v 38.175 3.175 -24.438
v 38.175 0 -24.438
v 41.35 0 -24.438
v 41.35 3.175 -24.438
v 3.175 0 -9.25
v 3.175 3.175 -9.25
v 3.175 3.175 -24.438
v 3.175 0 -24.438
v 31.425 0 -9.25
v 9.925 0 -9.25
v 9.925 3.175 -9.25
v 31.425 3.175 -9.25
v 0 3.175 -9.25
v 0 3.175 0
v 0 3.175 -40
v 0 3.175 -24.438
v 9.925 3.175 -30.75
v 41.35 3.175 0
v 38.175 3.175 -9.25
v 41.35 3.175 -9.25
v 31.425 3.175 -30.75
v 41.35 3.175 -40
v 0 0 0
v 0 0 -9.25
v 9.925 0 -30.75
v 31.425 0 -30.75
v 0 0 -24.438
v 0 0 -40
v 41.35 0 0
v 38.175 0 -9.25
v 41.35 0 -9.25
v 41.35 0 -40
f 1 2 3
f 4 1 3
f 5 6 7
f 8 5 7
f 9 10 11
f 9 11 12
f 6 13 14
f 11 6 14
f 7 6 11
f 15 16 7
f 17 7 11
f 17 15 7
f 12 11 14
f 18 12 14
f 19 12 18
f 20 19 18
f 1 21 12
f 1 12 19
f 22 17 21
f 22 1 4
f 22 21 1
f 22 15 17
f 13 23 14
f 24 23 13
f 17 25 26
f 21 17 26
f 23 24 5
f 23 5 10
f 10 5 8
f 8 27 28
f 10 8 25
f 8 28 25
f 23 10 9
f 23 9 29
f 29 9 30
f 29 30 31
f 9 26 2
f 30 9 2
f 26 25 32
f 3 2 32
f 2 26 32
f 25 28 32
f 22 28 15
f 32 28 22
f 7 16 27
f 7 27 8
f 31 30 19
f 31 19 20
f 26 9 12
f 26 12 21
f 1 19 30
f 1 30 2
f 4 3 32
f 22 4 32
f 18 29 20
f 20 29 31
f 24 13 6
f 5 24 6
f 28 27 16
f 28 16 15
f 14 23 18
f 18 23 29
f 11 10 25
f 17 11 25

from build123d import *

# Parameters (mm, degrees)
SKETCH1_W           = 41.35
SKETCH1_H           = 40
SKETCH1_W_2         = 21.5
SKETCH1_H_2         = 21.5
BOSS_EXTRUDE1_DEPTH = 3.175
SKETCH2_W           = 3.175
SKETCH2_H           = 15.188
CUT_EXTRUDE1_DEPTH  = 4.175


with BuildPart() as part:
    # Sketch1 → Boss-Extrude1 (new body)
    with BuildSketch(Plane(origin=(0, 0, 0), x_dir=(1, 0, 0), z_dir=(0, 1, 0))):
        with Locations((20.675, 20)):
            Rectangle(SKETCH1_W, SKETCH1_H)
        with Locations((20.675, 20)):
            Rectangle(SKETCH1_W_2, SKETCH1_H_2, mode=Mode.SUBTRACT)
    extrude(amount=BOSS_EXTRUDE1_DEPTH)

    # Sketch2 → Cut-Extrude1 (cut, through all)
    with BuildSketch(Plane(origin=(0, 3.175, 0), x_dir=(1, 0, 0), z_dir=(0, 1, 0))):
        with Locations((39.7625, 16.844)):
            Rectangle(SKETCH2_W, SKETCH2_H)
        with Locations((1.5875, 16.844)):
            Rectangle(SKETCH2_W, SKETCH2_H)
    extrude(amount=-CUT_EXTRUDE1_DEPTH, mode=Mode.SUBTRACT)


solid = part.part
